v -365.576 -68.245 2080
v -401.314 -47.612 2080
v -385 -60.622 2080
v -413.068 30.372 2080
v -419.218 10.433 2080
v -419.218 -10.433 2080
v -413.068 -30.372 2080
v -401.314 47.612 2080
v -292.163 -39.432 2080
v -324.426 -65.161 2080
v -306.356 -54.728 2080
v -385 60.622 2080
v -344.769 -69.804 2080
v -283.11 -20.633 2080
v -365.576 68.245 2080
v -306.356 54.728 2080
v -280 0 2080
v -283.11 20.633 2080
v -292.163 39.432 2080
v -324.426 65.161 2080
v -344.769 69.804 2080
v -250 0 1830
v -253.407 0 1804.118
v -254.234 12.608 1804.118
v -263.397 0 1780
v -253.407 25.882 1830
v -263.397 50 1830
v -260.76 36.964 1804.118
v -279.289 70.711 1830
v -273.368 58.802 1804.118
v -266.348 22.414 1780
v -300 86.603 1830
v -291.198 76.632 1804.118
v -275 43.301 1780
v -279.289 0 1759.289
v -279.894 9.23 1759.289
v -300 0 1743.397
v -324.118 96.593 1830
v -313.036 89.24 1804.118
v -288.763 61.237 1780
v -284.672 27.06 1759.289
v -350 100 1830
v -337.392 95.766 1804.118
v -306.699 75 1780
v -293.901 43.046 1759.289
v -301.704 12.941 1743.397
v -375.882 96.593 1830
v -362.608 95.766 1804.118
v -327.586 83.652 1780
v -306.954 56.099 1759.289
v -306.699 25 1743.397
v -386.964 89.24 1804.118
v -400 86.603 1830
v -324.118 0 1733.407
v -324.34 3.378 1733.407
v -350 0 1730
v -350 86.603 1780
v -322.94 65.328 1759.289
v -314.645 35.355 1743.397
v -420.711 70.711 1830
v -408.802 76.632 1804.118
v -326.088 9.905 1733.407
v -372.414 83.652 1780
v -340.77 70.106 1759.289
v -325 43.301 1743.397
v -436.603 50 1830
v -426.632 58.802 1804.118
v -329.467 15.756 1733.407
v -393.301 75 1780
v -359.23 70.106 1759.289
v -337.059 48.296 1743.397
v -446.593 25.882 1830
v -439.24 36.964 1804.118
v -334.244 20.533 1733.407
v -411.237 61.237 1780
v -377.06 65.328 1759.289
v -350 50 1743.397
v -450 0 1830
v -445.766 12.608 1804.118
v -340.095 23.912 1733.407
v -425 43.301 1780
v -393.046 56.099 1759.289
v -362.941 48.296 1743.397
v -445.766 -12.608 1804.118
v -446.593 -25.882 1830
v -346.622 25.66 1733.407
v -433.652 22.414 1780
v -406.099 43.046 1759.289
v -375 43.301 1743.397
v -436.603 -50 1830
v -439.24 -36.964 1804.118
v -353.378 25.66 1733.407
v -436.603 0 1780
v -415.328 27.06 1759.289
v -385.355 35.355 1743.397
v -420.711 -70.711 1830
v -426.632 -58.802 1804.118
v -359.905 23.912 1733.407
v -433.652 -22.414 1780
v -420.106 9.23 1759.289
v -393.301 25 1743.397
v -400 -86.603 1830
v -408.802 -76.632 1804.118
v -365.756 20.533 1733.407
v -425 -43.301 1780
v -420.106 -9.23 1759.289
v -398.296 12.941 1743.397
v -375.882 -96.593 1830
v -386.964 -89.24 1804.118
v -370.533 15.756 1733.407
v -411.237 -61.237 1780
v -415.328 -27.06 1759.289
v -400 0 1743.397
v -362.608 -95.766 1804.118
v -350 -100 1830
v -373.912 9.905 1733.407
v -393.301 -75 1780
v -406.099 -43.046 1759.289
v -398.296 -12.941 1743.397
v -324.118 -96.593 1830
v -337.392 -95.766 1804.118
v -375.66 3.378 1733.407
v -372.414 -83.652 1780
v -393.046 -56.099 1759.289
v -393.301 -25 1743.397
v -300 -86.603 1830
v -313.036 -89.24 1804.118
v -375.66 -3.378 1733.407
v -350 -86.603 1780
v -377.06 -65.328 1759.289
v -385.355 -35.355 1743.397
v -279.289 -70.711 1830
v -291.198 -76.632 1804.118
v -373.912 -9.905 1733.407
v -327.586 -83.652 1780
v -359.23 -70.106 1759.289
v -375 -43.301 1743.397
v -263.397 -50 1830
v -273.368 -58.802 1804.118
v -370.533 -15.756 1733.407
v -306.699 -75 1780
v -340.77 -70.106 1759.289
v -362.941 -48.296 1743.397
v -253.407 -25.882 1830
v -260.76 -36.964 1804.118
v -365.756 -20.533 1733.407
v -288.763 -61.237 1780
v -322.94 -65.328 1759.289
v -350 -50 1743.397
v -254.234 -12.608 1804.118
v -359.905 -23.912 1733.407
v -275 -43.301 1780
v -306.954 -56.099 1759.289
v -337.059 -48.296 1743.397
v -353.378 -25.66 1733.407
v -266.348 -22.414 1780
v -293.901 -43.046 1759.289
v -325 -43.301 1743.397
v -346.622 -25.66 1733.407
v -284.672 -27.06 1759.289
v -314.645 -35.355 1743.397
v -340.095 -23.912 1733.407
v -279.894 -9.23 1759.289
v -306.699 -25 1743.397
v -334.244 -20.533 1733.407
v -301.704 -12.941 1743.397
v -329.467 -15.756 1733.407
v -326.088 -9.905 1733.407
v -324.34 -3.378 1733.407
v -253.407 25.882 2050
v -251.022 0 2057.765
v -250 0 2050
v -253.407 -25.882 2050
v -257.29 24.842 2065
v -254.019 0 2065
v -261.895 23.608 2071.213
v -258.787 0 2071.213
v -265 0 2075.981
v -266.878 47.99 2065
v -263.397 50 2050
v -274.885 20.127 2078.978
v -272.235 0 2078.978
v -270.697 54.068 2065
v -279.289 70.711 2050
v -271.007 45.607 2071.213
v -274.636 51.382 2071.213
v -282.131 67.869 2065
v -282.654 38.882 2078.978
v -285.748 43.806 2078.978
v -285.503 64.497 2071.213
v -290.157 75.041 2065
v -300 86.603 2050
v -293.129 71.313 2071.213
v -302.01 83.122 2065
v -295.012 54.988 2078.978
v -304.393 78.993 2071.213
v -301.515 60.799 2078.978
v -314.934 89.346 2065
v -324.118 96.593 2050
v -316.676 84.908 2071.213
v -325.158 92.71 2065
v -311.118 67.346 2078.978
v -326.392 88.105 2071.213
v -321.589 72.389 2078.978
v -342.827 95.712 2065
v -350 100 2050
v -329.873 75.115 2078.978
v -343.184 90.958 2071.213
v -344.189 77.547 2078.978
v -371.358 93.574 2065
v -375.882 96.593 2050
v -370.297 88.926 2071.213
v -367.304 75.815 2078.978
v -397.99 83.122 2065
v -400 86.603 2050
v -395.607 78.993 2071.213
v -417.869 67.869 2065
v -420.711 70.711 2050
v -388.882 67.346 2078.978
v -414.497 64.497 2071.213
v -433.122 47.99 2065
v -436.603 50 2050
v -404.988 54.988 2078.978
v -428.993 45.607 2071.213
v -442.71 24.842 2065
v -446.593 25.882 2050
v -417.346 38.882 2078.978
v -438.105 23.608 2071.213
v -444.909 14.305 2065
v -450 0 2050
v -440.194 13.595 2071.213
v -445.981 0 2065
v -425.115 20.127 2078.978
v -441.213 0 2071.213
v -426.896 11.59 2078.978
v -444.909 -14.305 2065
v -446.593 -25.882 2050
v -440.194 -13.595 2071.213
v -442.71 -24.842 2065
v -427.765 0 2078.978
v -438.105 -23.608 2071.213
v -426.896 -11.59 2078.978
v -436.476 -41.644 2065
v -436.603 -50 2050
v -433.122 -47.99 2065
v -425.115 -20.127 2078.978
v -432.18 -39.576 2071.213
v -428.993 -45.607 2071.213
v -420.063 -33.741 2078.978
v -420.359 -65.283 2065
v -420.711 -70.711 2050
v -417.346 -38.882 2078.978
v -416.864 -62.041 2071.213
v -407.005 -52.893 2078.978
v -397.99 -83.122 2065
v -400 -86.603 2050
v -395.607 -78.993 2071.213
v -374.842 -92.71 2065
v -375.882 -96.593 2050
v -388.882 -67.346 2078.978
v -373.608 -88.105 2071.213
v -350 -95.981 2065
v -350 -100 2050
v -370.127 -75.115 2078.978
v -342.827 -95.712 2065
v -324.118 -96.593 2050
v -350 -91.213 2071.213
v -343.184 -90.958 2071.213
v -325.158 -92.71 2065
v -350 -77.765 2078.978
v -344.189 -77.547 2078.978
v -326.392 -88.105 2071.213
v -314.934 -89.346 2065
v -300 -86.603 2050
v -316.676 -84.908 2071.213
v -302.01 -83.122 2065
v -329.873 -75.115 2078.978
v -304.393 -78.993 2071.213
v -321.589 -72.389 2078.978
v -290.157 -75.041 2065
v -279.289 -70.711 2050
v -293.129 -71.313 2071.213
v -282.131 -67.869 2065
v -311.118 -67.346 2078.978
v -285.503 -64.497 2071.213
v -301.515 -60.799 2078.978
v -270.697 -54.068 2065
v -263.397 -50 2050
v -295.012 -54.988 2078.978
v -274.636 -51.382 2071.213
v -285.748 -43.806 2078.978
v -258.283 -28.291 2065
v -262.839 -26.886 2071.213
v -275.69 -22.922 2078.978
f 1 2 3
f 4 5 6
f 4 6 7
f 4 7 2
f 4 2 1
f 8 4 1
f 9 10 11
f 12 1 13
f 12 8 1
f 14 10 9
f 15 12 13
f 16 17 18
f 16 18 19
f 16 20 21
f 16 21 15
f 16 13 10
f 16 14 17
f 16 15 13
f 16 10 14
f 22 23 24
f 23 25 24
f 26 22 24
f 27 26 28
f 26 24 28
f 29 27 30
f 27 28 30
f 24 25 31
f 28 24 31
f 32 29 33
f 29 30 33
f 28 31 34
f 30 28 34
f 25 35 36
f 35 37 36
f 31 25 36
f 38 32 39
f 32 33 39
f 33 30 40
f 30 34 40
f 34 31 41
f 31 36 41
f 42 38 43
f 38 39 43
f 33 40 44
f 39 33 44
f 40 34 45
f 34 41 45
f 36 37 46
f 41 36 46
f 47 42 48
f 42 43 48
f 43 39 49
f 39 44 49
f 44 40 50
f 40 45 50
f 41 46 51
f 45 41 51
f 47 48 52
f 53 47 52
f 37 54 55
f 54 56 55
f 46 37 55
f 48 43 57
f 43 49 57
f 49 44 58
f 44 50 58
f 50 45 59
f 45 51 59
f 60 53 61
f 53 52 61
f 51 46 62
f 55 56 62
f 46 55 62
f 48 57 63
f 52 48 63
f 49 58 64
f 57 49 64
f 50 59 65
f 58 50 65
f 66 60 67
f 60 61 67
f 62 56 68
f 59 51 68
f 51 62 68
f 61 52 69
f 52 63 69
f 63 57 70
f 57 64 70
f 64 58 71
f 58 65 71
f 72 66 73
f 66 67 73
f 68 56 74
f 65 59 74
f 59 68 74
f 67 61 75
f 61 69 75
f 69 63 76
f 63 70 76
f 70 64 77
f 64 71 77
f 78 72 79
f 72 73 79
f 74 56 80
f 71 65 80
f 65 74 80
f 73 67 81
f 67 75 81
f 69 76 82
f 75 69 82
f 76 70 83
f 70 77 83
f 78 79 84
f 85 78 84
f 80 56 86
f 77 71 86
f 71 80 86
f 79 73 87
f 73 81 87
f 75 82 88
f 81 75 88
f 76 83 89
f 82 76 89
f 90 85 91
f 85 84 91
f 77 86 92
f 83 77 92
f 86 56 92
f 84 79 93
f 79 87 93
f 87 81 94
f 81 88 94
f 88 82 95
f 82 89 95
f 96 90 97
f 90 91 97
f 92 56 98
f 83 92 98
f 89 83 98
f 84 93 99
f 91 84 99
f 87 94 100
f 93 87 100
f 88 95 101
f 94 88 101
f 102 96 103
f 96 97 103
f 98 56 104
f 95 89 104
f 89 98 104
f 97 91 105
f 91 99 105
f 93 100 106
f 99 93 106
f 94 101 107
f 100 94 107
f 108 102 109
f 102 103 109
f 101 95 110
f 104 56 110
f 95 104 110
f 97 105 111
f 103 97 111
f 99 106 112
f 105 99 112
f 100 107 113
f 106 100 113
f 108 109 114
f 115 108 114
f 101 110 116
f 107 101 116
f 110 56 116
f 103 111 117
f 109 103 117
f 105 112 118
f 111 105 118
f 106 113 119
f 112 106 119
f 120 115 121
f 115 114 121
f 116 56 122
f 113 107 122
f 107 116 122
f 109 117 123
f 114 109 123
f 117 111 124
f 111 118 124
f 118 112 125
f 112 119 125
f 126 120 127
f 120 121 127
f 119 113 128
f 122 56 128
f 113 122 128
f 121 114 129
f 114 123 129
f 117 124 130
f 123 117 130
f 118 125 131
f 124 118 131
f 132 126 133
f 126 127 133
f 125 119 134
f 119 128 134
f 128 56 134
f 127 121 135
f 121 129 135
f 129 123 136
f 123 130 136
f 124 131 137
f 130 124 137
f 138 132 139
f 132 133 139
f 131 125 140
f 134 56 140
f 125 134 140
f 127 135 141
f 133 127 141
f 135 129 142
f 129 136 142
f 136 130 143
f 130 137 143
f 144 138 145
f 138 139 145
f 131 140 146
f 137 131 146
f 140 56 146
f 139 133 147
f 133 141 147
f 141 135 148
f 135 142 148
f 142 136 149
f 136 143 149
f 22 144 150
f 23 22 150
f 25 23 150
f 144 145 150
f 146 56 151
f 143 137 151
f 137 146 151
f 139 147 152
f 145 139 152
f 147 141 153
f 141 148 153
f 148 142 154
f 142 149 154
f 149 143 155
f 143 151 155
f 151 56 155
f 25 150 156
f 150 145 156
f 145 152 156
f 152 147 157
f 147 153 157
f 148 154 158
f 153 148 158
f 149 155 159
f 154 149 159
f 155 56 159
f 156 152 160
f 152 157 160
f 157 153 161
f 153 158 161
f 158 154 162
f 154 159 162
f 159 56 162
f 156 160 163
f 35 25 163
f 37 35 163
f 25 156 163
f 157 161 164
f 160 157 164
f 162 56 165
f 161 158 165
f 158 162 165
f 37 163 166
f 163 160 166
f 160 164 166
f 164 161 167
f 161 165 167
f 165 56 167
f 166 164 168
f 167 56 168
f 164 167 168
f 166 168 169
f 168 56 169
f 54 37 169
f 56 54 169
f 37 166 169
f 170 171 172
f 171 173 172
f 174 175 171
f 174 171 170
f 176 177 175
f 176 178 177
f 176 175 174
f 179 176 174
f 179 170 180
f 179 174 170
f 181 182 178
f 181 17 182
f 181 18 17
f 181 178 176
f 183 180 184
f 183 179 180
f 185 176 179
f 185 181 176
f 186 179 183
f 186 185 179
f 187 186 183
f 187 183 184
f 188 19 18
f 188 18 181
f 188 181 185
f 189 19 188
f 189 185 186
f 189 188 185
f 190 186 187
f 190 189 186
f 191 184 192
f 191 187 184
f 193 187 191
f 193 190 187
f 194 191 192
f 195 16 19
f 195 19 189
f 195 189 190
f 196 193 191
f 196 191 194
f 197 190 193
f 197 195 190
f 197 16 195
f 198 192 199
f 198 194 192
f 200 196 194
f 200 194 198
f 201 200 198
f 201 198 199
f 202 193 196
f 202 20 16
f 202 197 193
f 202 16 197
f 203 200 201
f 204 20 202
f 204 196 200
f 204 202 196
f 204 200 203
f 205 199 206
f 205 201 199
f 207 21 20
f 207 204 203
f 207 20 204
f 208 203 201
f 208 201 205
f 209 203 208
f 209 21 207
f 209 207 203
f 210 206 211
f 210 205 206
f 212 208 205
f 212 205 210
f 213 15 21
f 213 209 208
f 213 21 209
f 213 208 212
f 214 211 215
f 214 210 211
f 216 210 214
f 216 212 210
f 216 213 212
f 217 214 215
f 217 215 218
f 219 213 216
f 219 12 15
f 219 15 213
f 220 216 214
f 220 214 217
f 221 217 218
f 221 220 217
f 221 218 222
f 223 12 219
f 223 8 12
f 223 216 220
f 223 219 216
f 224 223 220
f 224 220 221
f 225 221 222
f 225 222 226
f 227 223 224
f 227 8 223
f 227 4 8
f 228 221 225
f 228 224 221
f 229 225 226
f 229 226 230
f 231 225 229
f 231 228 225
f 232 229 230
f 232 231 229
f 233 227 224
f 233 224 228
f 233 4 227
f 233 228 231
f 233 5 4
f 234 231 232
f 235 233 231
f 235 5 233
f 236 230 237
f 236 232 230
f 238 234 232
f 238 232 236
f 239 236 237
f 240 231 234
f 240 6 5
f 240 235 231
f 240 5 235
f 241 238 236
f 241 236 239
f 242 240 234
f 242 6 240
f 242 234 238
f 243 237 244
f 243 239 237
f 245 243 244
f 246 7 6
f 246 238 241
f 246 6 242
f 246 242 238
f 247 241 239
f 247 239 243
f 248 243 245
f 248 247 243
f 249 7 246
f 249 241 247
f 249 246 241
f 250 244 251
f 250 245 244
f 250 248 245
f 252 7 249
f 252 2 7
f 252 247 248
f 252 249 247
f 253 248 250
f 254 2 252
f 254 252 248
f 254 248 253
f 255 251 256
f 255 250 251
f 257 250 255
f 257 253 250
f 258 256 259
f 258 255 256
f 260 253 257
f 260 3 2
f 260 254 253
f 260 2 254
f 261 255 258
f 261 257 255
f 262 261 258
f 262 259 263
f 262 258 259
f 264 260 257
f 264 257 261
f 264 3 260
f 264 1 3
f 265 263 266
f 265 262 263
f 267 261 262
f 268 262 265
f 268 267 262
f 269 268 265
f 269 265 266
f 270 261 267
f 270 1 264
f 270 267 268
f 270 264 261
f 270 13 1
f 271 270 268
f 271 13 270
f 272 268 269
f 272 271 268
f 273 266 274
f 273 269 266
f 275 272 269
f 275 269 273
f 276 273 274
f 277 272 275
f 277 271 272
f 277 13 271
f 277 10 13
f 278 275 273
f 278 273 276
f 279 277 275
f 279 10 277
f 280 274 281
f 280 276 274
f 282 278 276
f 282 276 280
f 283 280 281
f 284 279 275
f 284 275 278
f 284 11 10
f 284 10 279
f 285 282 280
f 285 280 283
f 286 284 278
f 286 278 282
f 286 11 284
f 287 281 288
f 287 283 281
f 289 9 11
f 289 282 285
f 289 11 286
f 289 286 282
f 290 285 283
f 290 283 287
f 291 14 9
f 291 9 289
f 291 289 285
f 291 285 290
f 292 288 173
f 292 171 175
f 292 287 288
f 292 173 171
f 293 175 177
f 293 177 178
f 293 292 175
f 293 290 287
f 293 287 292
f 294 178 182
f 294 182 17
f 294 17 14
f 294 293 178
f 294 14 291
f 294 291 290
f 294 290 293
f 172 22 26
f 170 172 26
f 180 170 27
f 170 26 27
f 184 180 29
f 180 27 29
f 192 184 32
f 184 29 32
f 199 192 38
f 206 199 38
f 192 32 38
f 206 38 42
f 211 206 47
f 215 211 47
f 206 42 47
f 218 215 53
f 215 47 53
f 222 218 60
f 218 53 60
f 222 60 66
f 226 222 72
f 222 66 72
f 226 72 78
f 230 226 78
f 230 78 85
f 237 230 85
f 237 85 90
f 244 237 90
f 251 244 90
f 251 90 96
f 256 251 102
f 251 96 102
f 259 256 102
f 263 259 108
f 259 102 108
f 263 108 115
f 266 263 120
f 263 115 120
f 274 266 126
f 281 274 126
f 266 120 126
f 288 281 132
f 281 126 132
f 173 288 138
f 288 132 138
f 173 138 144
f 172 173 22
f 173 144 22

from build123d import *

# Parameters (mm, degrees)
CYLINDER005_R     = 100
CYLINDER005_DEPTH = 350
FILLET010_1_R     = 100
FILLET010_2_R     = 30


with BuildPart() as part:
    # Cylinder005 → Cylinder005 (new body)
    with BuildSketch(Plane(origin=(-350, 0, 1730), x_dir=(1, 0, 0), z_dir=(0, 0, 1))):
        Circle(CYLINDER005_R)
    extrude(amount=CYLINDER005_DEPTH)

    # Fillet010 1
    fillet010_1_edges = [part.edges().sort_by_distance(p)[0] for p in [
        (-450, 0, 1730),
    ]]
    fillet(fillet010_1_edges, radius=FILLET010_1_R)

    # Fillet010 2
    fillet010_2_edges = [part.edges().sort_by_distance(p)[0] for p in [
        (-450, 0, 2080),
    ]]
    fillet(fillet010_2_edges, radius=FILLET010_2_R)


solid = part.part
